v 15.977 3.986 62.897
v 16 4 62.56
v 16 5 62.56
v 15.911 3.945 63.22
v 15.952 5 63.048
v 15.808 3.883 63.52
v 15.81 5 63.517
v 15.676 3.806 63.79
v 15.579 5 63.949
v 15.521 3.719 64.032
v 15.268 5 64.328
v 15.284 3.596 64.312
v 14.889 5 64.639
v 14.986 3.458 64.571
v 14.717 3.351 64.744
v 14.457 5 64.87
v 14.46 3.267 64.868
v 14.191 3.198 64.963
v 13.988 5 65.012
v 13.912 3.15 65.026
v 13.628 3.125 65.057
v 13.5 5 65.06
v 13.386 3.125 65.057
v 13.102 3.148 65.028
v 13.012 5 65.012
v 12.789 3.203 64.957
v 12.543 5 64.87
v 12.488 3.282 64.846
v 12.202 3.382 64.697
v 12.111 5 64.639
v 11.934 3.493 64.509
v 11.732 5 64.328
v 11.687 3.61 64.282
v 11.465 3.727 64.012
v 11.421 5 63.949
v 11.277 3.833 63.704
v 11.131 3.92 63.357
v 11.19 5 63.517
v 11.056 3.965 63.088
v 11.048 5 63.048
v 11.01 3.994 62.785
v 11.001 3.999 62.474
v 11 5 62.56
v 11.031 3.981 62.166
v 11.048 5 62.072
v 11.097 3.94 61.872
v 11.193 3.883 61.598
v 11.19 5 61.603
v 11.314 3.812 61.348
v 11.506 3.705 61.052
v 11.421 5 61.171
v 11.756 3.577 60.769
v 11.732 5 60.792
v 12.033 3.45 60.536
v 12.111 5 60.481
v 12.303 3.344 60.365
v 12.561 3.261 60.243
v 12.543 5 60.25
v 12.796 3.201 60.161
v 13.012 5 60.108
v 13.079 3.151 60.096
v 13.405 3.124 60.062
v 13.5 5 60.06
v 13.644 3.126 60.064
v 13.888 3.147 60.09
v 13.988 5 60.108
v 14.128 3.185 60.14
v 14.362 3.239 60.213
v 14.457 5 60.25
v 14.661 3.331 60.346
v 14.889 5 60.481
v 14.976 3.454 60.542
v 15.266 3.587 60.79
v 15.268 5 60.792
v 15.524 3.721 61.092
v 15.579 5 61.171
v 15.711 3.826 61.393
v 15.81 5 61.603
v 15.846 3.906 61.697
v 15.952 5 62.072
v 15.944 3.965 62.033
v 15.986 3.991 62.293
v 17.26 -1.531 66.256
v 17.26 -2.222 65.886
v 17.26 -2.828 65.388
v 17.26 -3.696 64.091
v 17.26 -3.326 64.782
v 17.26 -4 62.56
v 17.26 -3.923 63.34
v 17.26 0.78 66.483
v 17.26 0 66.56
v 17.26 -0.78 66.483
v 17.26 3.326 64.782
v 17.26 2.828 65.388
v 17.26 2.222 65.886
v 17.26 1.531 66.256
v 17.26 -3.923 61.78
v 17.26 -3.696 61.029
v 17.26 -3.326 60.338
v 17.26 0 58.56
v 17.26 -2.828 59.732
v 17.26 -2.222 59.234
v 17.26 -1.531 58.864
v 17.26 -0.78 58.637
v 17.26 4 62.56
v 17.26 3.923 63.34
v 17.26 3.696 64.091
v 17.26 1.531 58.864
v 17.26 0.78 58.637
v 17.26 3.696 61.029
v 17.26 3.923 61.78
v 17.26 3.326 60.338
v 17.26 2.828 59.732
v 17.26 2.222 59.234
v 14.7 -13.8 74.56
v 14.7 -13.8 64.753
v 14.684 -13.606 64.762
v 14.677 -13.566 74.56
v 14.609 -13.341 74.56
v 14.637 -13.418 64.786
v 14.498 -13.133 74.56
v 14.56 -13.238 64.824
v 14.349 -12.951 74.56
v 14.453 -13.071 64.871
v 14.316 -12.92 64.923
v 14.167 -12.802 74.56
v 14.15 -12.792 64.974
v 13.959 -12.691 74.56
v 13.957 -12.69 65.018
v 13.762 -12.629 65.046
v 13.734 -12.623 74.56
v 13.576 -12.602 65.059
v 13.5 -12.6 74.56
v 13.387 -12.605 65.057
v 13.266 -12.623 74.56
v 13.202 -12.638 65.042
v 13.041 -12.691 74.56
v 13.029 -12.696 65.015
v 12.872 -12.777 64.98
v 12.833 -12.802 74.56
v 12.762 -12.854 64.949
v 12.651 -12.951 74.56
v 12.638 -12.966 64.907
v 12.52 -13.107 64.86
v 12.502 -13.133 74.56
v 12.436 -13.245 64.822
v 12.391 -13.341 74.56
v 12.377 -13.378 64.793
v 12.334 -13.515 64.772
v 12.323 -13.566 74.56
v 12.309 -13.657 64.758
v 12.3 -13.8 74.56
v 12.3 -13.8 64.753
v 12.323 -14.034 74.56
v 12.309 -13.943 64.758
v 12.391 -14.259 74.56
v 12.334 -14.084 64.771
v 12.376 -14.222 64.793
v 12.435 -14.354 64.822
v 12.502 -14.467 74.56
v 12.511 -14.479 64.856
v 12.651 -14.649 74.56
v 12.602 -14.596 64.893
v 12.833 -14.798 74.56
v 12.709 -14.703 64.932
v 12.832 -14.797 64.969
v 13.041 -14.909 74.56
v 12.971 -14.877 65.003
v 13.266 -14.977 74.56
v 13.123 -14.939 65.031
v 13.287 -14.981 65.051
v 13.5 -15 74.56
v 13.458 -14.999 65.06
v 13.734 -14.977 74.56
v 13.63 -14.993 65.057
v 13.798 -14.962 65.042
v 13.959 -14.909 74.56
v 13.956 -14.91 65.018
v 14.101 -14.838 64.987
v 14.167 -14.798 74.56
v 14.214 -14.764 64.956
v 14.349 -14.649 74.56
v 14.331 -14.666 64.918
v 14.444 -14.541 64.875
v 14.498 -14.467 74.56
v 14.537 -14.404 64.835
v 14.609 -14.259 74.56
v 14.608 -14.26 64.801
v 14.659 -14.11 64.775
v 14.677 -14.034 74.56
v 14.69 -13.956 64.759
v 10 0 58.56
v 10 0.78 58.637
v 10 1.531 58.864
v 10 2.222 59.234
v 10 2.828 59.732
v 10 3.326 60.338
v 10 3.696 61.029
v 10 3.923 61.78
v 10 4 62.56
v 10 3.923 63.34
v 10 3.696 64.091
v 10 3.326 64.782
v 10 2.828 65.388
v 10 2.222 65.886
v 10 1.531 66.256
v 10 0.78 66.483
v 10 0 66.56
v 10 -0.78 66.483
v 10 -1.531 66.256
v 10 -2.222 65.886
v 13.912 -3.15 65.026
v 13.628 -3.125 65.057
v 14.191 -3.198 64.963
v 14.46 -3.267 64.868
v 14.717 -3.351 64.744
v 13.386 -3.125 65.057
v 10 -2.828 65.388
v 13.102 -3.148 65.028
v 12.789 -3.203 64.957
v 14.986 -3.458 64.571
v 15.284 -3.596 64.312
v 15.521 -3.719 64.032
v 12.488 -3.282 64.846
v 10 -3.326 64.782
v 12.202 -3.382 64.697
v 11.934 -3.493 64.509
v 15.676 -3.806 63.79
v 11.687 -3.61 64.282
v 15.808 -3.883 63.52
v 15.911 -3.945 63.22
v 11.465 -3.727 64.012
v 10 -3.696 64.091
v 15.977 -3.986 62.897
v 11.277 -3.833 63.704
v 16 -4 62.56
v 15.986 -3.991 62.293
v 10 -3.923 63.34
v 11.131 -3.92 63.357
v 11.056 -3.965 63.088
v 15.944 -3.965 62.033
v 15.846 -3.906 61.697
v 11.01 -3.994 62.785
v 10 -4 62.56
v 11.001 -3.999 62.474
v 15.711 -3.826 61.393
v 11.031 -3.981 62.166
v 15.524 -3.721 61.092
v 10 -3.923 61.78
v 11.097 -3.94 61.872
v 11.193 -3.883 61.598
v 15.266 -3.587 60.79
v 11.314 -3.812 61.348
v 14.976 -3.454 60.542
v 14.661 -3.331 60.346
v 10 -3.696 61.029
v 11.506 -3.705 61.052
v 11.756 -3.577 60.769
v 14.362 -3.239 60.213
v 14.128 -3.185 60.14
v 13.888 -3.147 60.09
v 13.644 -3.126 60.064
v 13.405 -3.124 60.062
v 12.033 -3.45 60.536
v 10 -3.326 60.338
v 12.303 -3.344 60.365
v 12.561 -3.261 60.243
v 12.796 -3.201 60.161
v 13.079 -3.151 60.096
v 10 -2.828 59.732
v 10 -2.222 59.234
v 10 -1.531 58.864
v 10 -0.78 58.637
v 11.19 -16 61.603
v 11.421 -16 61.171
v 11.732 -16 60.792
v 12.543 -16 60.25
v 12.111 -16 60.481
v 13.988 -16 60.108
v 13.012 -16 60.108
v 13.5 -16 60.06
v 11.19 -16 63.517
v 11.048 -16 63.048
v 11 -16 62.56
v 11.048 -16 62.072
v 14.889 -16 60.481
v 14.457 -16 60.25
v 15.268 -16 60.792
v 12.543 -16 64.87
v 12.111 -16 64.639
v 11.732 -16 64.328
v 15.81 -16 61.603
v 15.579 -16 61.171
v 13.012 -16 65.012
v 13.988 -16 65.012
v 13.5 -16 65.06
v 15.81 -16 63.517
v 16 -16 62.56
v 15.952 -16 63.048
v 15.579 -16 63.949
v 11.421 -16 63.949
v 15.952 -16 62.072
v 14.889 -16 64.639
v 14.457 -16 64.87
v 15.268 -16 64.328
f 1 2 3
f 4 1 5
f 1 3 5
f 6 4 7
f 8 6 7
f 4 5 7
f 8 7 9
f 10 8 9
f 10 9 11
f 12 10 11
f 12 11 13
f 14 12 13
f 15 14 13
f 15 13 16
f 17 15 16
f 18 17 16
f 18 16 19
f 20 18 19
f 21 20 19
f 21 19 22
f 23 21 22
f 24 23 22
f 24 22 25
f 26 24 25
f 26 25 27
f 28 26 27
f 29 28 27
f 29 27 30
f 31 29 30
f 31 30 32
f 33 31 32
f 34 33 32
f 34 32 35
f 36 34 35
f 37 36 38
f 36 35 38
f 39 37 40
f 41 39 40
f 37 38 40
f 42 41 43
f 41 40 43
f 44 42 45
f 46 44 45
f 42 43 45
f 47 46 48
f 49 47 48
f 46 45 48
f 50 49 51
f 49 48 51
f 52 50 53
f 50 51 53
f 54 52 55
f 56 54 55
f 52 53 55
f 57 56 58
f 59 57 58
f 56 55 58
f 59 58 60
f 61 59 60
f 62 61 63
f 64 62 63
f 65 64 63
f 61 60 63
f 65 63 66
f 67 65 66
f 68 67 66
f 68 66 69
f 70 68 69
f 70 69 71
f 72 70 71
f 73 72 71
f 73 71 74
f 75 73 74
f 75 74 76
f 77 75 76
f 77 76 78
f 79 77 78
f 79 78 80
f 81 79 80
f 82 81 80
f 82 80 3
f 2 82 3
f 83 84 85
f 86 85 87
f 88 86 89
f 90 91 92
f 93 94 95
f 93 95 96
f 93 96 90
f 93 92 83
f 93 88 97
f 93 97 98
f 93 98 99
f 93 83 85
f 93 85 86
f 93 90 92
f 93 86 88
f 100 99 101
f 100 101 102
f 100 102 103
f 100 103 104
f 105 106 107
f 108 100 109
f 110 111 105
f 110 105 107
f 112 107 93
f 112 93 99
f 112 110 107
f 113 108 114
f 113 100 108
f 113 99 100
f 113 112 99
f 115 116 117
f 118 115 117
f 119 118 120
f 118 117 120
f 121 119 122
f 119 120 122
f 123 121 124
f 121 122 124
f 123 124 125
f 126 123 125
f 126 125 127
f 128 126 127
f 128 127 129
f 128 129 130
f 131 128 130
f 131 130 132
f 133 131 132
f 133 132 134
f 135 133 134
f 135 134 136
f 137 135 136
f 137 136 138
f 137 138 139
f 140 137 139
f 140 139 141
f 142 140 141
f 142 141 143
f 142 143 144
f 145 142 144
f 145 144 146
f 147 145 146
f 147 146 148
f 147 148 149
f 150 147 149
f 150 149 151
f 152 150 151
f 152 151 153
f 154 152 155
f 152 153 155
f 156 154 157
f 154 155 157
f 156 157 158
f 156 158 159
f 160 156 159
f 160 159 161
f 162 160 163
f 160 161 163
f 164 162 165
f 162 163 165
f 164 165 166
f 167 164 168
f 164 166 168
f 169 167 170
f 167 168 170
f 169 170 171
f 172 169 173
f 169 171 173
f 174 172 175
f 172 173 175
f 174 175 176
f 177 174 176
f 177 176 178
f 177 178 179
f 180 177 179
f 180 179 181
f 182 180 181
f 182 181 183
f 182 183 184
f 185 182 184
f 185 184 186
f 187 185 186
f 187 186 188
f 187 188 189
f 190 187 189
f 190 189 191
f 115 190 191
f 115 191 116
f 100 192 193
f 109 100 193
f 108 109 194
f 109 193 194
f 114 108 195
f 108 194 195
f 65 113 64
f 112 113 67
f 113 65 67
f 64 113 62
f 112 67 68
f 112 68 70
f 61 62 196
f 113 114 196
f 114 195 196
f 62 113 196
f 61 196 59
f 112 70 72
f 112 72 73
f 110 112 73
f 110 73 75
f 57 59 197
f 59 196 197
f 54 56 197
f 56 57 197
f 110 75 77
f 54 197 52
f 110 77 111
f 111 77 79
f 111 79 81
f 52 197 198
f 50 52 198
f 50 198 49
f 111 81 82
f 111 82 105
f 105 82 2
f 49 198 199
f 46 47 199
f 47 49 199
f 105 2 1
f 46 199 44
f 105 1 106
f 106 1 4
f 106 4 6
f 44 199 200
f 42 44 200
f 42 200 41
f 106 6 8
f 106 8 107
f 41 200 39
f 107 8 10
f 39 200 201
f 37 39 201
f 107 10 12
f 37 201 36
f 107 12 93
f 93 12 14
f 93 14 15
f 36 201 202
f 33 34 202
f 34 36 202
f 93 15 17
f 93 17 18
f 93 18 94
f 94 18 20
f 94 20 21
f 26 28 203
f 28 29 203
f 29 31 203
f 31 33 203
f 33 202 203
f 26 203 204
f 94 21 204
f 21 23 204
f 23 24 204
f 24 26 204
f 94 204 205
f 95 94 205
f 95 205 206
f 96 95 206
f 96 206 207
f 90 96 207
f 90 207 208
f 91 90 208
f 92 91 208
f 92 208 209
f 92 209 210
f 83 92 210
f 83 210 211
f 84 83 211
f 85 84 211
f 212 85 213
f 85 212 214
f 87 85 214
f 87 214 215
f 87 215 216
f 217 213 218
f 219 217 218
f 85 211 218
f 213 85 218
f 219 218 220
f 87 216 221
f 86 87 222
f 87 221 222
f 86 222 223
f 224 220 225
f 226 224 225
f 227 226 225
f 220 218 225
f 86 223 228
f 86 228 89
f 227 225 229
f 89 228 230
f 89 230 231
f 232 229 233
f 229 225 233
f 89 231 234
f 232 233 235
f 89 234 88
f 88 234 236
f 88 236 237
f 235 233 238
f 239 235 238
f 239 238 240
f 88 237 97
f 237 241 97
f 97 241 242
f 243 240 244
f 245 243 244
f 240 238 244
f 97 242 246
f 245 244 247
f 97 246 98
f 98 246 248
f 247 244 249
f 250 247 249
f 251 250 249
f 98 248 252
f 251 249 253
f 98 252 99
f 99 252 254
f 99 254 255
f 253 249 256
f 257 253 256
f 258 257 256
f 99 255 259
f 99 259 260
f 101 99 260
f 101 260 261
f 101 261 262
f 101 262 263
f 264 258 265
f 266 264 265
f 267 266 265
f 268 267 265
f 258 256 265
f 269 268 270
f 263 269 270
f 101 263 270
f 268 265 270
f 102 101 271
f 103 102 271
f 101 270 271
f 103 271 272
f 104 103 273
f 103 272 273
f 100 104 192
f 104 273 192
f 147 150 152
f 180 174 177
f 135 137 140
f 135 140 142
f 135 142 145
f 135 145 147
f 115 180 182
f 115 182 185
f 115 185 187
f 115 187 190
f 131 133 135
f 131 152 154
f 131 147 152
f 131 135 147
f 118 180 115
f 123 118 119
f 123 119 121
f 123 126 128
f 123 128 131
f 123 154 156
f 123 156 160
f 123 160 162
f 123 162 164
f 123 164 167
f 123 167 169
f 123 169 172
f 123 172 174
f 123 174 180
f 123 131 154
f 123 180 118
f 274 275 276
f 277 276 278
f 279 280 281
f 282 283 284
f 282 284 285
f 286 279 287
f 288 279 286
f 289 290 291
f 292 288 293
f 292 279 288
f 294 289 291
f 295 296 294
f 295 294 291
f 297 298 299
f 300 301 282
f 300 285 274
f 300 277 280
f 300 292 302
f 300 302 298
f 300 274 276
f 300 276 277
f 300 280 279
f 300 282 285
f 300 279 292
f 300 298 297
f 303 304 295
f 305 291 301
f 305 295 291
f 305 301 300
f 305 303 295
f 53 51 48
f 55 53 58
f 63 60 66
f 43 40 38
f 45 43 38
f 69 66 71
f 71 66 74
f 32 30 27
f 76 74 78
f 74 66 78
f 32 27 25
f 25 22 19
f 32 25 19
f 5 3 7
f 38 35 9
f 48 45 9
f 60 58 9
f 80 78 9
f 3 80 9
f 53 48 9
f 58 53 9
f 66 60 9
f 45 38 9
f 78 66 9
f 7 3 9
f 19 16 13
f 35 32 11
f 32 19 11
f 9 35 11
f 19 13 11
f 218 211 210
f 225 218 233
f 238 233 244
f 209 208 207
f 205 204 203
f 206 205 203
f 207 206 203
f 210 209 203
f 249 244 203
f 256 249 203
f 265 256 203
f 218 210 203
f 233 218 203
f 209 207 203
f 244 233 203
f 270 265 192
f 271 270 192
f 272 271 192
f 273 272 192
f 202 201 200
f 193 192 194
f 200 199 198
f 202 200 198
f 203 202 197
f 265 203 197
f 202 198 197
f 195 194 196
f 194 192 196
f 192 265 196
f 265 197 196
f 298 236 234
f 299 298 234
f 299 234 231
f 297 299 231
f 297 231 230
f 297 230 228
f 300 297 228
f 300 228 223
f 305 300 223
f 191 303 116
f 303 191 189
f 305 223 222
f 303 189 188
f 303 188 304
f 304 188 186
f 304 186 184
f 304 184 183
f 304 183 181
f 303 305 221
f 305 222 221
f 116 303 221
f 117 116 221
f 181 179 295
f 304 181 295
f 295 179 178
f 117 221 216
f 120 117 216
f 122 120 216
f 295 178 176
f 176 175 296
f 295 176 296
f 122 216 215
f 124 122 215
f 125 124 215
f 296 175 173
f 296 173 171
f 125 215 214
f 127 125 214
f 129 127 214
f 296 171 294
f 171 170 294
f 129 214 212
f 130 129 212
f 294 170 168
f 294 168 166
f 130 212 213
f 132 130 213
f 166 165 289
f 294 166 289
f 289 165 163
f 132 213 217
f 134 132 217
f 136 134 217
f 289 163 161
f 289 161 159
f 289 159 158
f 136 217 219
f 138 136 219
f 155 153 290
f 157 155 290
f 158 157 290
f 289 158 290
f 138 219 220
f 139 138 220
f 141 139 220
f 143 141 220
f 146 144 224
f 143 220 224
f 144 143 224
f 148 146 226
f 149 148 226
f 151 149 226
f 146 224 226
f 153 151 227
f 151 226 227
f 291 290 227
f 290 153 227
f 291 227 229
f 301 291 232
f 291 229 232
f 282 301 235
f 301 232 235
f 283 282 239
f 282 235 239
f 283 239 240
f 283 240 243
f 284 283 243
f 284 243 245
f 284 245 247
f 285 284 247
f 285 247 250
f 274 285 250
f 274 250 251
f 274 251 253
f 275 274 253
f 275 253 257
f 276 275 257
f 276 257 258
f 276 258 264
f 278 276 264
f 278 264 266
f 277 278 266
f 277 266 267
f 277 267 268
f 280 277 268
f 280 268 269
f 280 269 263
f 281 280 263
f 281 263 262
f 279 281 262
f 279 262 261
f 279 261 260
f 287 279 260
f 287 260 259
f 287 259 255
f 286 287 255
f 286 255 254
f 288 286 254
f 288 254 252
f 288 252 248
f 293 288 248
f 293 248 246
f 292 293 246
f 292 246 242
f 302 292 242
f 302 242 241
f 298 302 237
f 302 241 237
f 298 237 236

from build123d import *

# Parameters (mm, degrees)
CYLINDER012_R     = 2.5
CYLINDER012_DEPTH = 21
CYLINDER011_R     = 1.2
CYLINDER011_DEPTH = 12
CYLINDER010_R     = 4
CYLINDER010_DEPTH = 7.26


with BuildPart() as cylinder012:
    # Cylinder012 → Cylinder012 (new body)
    with BuildSketch(Plane(origin=(3.5, 5, 0), x_dir=(1, 0, 0), z_dir=(0, -1, 0))):
        Circle(CYLINDER012_R)
    extrude(amount=CYLINDER012_DEPTH)


with BuildPart() as cylinder011:
    # Cylinder011 → Cylinder011 (new body)
    with BuildSketch(Plane(origin=(3.5, -13.8, 0), x_dir=(1, 0, 0), z_dir=(0, 0, 1))):
        Circle(CYLINDER011_R)
    extrude(amount=CYLINDER011_DEPTH)


with BuildPart() as valve003:
    # Cylinder010 → Cylinder010 (new body)
    with BuildSketch(Plane(origin=(0, 0, 0), x_dir=(0, 0, -1), z_dir=(1, 0, 0))):
        Circle(CYLINDER010_R)
    extrude(amount=CYLINDER010_DEPTH)

    # Fusion003: union Cylinder012, Cylinder011
    add(cylinder012.part)
    add(cylinder011.part)


with BuildPart() as valve003_1:
    # Fusion003 placement: moved
    add(valve003.part.moved(Location((10, 0, 62.56))))


solid = valve003_1.part
